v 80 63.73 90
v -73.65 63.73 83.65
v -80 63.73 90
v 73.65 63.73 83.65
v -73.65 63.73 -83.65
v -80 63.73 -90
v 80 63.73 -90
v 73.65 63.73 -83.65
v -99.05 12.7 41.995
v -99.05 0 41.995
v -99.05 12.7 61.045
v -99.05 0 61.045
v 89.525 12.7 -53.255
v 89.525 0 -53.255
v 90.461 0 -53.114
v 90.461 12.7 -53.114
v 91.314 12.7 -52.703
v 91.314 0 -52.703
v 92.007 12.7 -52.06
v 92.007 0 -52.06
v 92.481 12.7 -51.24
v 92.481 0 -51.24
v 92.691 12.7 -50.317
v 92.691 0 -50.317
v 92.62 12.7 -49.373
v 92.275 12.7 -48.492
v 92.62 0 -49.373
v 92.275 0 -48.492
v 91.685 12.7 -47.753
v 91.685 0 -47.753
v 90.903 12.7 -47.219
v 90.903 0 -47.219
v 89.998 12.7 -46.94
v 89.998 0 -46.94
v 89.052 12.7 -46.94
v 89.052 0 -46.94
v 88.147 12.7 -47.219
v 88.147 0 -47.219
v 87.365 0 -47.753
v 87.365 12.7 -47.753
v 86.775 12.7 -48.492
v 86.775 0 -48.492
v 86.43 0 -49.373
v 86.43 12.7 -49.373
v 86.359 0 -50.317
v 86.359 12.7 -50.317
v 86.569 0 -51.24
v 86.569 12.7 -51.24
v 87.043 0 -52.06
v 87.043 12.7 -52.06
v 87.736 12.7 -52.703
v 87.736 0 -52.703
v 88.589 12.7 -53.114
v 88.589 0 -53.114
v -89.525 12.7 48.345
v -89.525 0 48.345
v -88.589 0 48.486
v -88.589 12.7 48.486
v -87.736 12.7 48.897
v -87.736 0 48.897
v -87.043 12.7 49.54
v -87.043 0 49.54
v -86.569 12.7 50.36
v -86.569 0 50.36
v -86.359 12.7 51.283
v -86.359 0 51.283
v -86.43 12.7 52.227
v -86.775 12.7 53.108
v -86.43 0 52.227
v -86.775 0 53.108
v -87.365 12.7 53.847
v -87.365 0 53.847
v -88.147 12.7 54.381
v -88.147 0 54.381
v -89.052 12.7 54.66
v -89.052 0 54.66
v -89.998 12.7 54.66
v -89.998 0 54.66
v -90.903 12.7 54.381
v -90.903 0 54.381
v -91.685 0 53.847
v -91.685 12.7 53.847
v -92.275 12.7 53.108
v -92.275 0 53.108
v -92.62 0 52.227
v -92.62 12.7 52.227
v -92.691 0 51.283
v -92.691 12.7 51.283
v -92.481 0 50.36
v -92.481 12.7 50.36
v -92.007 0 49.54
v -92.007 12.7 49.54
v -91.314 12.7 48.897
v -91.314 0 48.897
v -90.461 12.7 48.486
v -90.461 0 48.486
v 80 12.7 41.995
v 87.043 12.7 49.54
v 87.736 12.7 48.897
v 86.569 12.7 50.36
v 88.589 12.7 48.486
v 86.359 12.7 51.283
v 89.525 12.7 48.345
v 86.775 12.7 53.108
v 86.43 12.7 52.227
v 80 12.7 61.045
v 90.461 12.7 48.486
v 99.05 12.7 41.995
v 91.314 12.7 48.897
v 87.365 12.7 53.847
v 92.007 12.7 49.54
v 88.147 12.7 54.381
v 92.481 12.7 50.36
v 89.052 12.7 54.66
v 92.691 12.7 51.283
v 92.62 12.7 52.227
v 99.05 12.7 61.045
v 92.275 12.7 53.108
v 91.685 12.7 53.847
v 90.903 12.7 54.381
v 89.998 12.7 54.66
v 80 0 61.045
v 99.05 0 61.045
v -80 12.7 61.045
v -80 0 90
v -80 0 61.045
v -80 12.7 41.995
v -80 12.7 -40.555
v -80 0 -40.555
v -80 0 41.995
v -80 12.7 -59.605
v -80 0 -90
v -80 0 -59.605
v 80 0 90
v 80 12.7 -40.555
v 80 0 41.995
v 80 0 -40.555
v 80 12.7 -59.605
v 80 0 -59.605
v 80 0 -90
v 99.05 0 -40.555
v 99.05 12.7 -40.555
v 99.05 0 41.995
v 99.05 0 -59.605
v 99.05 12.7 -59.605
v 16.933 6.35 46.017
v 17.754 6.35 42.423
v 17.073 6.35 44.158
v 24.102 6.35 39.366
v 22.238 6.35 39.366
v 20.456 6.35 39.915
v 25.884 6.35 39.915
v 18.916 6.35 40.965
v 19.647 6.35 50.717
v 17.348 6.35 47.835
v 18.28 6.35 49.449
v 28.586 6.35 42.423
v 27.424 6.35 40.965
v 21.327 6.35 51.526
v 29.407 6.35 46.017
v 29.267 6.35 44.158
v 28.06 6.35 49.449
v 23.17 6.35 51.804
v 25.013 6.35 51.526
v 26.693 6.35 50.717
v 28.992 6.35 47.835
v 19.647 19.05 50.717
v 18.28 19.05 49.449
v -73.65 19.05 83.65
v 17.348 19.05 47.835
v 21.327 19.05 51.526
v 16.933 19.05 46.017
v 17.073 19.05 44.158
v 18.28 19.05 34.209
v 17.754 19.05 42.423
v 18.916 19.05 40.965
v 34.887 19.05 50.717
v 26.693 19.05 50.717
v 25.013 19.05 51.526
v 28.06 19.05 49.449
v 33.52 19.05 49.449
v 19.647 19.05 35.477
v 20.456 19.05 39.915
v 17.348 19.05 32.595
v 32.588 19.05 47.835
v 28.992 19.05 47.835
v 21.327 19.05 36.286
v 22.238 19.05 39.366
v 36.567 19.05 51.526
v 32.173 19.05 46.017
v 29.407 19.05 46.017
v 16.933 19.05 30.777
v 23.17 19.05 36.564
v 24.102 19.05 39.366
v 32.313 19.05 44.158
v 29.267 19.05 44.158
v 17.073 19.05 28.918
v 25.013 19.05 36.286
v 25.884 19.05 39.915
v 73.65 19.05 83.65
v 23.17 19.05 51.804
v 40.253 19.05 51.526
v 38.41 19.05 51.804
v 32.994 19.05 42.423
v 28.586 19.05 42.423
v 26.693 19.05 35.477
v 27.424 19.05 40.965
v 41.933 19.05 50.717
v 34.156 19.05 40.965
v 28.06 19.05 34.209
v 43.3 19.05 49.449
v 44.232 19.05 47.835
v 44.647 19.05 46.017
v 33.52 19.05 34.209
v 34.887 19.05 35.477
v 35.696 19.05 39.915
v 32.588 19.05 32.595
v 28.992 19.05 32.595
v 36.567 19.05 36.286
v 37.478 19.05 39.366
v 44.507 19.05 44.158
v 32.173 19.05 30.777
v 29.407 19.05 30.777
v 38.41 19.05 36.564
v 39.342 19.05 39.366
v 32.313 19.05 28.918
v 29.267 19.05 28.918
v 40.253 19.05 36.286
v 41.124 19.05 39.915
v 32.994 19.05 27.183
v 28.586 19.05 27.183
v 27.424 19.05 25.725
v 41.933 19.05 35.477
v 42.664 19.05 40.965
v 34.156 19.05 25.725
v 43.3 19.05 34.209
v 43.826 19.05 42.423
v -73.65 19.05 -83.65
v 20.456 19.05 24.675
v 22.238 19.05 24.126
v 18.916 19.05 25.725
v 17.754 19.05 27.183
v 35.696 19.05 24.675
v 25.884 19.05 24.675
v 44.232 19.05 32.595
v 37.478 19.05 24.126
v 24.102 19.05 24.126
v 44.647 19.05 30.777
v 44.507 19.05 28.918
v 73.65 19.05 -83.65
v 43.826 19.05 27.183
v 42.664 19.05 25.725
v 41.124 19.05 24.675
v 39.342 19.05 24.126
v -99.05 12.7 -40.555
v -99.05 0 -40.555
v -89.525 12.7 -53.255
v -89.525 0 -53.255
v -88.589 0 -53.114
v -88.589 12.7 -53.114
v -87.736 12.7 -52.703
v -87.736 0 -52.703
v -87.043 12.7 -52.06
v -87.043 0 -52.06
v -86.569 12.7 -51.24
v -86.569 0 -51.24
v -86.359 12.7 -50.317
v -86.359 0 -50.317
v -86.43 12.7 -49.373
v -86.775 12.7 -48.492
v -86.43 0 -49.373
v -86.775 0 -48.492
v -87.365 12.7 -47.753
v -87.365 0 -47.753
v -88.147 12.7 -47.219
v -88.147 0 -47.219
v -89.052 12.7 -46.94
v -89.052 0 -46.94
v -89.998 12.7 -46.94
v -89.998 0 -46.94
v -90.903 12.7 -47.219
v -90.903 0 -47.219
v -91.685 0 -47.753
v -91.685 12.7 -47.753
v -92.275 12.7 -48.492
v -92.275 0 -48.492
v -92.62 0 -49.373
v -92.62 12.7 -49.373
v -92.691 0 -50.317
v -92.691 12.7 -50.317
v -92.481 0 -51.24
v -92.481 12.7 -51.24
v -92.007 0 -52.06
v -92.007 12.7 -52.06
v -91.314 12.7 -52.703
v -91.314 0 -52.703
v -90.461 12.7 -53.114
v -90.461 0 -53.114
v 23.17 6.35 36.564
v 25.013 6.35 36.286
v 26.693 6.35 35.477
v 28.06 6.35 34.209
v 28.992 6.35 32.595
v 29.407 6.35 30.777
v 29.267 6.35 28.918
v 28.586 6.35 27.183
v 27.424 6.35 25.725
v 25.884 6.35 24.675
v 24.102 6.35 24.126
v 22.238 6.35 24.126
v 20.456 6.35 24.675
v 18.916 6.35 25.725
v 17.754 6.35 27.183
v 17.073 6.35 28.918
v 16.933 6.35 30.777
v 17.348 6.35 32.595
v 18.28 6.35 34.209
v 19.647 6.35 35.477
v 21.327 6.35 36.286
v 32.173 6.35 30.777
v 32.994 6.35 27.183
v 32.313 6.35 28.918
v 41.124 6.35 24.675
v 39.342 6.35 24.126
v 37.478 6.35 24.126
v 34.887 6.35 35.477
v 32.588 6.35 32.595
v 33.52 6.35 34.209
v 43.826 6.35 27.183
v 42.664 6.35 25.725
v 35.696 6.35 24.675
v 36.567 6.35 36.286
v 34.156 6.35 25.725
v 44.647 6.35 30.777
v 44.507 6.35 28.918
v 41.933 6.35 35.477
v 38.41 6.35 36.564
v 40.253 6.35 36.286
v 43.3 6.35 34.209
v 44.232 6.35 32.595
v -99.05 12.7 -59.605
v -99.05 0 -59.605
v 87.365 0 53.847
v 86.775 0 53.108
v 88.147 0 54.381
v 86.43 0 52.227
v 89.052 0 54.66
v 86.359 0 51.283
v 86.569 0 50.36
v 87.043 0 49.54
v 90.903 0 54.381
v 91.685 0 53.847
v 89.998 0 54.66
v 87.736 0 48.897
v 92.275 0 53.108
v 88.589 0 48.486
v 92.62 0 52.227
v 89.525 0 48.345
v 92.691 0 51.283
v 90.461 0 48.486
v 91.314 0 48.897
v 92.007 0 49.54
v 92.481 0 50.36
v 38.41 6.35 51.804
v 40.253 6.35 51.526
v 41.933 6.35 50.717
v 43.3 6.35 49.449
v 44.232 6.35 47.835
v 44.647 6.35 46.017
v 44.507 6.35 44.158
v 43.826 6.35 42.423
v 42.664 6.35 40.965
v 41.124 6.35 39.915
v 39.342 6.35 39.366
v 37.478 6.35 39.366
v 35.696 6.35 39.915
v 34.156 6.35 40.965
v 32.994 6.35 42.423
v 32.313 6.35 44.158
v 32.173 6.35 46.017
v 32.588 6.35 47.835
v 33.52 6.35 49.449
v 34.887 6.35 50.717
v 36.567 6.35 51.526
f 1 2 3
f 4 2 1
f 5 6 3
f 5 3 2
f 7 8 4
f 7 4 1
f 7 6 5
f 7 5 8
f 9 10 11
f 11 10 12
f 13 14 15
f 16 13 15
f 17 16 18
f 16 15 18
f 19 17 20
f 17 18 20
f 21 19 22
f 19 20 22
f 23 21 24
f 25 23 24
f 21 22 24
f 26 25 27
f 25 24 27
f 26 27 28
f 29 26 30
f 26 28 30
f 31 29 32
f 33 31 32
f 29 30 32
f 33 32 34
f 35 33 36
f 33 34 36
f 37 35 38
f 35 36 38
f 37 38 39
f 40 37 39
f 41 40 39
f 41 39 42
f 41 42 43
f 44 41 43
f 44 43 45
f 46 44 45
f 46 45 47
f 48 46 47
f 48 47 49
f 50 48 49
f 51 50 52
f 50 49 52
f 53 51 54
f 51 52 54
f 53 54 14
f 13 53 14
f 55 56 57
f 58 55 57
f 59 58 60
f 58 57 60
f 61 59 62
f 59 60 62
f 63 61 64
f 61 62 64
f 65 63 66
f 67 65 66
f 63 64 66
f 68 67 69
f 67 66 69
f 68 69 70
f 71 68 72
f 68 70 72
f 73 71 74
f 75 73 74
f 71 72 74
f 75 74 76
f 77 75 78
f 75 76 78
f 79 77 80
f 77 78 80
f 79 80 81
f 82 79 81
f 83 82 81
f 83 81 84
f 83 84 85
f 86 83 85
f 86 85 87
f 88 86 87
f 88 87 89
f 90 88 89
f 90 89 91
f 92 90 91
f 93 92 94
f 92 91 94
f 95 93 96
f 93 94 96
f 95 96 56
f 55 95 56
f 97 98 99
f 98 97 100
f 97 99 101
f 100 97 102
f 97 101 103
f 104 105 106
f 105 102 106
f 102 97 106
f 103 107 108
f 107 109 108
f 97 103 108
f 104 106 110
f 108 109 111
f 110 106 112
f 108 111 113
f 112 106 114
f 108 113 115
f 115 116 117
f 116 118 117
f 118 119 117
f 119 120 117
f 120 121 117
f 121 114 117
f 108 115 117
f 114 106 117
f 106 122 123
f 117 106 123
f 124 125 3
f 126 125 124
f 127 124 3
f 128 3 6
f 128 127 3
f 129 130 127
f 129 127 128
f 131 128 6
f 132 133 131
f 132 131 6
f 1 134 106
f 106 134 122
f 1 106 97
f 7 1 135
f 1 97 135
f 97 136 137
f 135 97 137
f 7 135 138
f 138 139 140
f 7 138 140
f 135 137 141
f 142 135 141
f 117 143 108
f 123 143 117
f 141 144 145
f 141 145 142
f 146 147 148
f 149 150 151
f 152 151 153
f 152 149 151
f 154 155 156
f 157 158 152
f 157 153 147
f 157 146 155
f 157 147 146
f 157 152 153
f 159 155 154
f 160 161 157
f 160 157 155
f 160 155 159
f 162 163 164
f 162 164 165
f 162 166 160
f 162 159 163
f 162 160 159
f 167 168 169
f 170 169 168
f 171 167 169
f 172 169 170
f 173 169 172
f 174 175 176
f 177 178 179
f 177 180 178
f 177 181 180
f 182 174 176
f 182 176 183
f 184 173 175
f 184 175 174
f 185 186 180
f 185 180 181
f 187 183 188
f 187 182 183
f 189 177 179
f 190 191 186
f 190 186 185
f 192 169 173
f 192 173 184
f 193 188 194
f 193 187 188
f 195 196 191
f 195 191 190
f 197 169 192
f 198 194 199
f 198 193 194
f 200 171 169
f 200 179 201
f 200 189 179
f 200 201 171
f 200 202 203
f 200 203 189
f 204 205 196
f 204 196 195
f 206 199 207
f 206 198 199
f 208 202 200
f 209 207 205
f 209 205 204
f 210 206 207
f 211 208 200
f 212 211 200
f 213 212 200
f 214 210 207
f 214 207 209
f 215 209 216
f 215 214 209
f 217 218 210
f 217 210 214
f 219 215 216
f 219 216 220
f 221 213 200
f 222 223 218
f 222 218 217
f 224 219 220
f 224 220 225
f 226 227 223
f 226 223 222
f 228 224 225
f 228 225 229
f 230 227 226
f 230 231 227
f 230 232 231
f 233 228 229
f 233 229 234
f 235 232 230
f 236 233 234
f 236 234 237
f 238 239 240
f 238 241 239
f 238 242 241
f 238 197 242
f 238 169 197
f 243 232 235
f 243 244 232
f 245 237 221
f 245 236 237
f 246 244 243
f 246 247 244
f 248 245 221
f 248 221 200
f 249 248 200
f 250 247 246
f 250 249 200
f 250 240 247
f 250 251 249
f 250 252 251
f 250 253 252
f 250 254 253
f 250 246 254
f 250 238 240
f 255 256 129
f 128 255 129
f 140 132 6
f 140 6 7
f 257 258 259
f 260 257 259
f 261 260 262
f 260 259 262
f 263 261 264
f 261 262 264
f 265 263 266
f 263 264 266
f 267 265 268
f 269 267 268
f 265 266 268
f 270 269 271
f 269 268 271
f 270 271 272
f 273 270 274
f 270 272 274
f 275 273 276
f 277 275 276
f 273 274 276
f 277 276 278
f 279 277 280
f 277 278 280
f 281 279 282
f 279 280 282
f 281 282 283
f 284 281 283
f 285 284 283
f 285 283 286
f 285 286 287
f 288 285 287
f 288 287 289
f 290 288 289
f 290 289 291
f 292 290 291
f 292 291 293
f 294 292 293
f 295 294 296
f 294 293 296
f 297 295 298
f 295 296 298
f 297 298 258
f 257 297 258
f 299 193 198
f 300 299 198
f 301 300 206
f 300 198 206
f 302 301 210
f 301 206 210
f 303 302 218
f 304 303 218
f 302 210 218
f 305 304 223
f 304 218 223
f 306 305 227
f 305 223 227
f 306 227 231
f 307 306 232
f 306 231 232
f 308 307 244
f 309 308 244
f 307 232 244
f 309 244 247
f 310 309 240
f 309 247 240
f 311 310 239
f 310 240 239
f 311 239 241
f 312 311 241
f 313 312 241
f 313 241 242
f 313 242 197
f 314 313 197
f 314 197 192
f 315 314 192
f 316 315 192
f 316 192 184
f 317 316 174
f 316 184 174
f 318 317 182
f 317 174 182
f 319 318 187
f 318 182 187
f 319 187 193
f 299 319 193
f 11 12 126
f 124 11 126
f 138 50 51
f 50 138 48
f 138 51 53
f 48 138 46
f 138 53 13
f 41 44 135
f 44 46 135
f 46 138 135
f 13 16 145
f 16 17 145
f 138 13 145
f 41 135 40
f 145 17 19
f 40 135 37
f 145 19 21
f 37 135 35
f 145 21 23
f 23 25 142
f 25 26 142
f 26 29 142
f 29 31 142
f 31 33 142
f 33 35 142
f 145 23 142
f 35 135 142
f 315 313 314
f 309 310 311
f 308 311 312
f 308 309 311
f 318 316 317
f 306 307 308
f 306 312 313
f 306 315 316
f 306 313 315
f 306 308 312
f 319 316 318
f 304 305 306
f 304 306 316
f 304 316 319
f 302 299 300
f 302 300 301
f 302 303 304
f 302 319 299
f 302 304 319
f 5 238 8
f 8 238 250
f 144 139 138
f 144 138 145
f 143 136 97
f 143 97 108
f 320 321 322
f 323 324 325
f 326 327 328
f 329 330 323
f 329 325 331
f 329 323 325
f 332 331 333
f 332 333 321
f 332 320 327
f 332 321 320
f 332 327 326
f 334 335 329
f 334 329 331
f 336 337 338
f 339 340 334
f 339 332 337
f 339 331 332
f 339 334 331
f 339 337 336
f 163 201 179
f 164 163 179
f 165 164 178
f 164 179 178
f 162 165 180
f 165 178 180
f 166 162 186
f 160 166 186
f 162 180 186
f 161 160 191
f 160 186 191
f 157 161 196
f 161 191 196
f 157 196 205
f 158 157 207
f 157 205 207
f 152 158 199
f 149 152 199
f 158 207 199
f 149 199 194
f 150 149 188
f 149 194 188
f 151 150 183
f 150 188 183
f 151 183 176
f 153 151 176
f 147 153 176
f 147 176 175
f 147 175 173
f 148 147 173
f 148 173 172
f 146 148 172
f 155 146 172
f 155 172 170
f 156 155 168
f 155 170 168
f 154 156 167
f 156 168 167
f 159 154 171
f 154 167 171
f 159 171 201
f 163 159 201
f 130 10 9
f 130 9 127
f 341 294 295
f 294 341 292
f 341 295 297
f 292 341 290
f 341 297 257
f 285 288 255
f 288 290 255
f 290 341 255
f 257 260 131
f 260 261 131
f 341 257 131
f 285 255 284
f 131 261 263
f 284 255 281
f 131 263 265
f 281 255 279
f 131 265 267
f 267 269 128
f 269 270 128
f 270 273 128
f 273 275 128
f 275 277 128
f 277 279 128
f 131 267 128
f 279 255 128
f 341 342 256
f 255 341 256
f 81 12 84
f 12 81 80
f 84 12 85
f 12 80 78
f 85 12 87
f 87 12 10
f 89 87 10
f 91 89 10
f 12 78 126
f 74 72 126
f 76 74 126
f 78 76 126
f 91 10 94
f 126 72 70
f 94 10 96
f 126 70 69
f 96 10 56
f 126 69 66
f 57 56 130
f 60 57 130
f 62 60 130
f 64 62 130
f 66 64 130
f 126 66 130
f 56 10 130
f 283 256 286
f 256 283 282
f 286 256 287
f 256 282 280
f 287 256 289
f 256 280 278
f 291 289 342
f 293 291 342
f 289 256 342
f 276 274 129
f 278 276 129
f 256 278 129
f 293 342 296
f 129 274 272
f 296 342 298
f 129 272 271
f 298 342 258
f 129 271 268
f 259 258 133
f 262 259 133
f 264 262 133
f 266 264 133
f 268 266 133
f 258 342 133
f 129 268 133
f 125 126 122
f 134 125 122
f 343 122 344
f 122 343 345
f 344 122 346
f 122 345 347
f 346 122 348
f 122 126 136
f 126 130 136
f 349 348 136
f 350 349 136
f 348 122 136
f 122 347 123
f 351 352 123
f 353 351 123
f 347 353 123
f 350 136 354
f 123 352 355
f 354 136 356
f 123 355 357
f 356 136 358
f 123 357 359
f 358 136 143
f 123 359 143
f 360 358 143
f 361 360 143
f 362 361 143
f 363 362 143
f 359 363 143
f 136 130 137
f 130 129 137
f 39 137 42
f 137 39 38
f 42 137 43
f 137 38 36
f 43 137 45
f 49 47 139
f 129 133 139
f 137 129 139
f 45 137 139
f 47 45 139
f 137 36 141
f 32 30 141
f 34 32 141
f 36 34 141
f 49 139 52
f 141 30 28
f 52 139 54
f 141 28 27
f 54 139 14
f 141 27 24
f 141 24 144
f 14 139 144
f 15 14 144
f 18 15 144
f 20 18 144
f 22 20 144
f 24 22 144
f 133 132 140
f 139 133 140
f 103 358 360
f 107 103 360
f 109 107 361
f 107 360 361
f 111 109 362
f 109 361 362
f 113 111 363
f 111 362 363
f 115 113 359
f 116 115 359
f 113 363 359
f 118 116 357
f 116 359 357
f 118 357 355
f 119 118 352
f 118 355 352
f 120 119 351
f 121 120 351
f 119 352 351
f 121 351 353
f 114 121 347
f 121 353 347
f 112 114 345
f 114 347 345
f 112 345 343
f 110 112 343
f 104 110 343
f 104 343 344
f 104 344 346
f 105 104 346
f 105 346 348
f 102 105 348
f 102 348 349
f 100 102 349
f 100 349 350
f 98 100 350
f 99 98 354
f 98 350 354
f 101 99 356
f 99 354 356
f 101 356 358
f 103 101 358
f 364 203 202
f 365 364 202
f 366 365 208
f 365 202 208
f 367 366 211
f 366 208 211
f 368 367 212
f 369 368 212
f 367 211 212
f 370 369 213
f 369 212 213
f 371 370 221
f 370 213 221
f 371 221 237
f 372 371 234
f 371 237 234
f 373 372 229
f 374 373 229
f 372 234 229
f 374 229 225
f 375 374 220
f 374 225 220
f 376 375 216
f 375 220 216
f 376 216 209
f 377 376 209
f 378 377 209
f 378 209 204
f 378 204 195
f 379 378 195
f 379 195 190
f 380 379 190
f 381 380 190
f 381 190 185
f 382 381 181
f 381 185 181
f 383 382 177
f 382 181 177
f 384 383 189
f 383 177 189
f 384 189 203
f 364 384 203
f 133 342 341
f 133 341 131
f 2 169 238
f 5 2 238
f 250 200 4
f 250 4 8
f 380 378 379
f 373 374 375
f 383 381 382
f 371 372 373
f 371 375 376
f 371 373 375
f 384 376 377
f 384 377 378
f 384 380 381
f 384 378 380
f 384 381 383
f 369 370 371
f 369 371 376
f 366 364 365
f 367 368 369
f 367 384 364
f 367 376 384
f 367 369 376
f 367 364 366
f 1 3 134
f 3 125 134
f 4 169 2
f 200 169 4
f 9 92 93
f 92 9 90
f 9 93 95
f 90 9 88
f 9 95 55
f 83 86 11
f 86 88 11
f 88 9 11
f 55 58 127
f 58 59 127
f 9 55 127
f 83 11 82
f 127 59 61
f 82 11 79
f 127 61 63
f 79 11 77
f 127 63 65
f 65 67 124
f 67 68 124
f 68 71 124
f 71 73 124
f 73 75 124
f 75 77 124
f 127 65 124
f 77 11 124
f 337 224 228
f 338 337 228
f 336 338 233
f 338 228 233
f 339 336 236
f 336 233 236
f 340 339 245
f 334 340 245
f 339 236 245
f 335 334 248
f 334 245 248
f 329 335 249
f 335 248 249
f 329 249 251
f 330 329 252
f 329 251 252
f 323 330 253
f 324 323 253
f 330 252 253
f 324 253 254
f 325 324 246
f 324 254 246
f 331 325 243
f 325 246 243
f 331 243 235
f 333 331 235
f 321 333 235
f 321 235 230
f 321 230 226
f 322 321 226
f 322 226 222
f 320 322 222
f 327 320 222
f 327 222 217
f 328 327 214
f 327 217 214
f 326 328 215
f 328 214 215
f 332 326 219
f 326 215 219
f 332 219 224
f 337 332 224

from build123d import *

# Parameters (mm, degrees)
SKETCH1_W           = 160
SKETCH1_H           = 180
BOSS_EXTRUDE1_DEPTH = 19.05
SKETCH2_W           = 160
SKETCH2_H           = 180
SKETCH2_W_2         = 147.3
SKETCH2_H_2         = 167.3
BOSS_EXTRUDE2_DEPTH = 44.680000048
SKETCH3_R           = 6.253999938
CUT_EXTRUDE1_DEPTH  = 12.7
SKETCH4_W           = 19.05
SKETCH4_H           = 19.05
SKETCH4_R           = 3.175
BOSS_EXTRUDE3_DEPTH = 12.7


with BuildPart() as part:
    # Sketch1 → Boss-Extrude1 (new body)
    with BuildSketch(Plane(origin=(0, 0, 0), x_dir=(1, 0, 0), z_dir=(0, 1, 0))):
        Rectangle(SKETCH1_W, SKETCH1_H)
    extrude(amount=BOSS_EXTRUDE1_DEPTH)

    # Sketch2 → Boss-Extrude2 (add)
    with BuildSketch(Plane(origin=(0, 19.05, 0), x_dir=(1, 0, 0), z_dir=(0, 1, 0))):
        Rectangle(SKETCH2_W, SKETCH2_H)
        Rectangle(SKETCH2_W_2, SKETCH2_H_2, mode=Mode.SUBTRACT)
    extrude(amount=BOSS_EXTRUDE2_DEPTH)

    # Sketch3 → Cut-Extrude1 (cut)
    with BuildSketch(Plane(origin=(0, 19.05, 0), x_dir=(1, 0, 0), z_dir=(0, 1, 0))):
        with Locations(Location((38.41, -45.55, 0), (0, 0, 270))):
            Circle(SKETCH3_R)
        with Locations(Location((23.17, -45.55, 0), (0, 0, 270))):
            Circle(SKETCH3_R)
        with Locations(Location((38.41, -30.31, 0), (0, 0, 270))):
            Circle(SKETCH3_R)
        with Locations(Location((23.17, -30.31, 0), (0, 0, 270))):
            Circle(SKETCH3_R)
    extrude(amount=-CUT_EXTRUDE1_DEPTH, mode=Mode.SUBTRACT)

    # Sketch4 → Boss-Extrude3 (add)
    # profile 1 of 4: a face of its own
    with BuildSketch(Plane.XZ):
        with Locations((-89.525, -50.08)):
            Rectangle(SKETCH4_W, SKETCH4_H)
        with Locations(Location((-89.525, -50.08, 0), (0, 0, 270))):
            Circle(SKETCH4_R, mode=Mode.SUBTRACT)
    # profile 2 of 4: a face of its own
    with BuildSketch(Plane.XZ):
        with Locations((-89.525, 51.52)):
            Rectangle(SKETCH4_W, SKETCH4_H)
        with Locations(Location((-89.525, 51.52, 0), (0, 0, 270))):
            Circle(SKETCH4_R, mode=Mode.SUBTRACT)
    # profile 3 of 4: a face of its own
    with BuildSketch(Plane.XZ):
        with Locations((89.525, -50.08)):
            Rectangle(SKETCH4_W, SKETCH4_H)
        with Locations(Location((89.525, -50.08, 0), (0, 0, 270))):
            Circle(SKETCH4_R, mode=Mode.SUBTRACT)
    # profile 4 of 4: a face of its own
    with BuildSketch(Plane.XZ):
        with Locations((89.525, 51.52)):
            Rectangle(SKETCH4_W, SKETCH4_H)
        with Locations(Location((89.525, 51.52, 0), (0, 0, 270))):
            Circle(SKETCH4_R, mode=Mode.SUBTRACT)
    extrude(amount=-BOSS_EXTRUDE3_DEPTH)


solid = part.part
